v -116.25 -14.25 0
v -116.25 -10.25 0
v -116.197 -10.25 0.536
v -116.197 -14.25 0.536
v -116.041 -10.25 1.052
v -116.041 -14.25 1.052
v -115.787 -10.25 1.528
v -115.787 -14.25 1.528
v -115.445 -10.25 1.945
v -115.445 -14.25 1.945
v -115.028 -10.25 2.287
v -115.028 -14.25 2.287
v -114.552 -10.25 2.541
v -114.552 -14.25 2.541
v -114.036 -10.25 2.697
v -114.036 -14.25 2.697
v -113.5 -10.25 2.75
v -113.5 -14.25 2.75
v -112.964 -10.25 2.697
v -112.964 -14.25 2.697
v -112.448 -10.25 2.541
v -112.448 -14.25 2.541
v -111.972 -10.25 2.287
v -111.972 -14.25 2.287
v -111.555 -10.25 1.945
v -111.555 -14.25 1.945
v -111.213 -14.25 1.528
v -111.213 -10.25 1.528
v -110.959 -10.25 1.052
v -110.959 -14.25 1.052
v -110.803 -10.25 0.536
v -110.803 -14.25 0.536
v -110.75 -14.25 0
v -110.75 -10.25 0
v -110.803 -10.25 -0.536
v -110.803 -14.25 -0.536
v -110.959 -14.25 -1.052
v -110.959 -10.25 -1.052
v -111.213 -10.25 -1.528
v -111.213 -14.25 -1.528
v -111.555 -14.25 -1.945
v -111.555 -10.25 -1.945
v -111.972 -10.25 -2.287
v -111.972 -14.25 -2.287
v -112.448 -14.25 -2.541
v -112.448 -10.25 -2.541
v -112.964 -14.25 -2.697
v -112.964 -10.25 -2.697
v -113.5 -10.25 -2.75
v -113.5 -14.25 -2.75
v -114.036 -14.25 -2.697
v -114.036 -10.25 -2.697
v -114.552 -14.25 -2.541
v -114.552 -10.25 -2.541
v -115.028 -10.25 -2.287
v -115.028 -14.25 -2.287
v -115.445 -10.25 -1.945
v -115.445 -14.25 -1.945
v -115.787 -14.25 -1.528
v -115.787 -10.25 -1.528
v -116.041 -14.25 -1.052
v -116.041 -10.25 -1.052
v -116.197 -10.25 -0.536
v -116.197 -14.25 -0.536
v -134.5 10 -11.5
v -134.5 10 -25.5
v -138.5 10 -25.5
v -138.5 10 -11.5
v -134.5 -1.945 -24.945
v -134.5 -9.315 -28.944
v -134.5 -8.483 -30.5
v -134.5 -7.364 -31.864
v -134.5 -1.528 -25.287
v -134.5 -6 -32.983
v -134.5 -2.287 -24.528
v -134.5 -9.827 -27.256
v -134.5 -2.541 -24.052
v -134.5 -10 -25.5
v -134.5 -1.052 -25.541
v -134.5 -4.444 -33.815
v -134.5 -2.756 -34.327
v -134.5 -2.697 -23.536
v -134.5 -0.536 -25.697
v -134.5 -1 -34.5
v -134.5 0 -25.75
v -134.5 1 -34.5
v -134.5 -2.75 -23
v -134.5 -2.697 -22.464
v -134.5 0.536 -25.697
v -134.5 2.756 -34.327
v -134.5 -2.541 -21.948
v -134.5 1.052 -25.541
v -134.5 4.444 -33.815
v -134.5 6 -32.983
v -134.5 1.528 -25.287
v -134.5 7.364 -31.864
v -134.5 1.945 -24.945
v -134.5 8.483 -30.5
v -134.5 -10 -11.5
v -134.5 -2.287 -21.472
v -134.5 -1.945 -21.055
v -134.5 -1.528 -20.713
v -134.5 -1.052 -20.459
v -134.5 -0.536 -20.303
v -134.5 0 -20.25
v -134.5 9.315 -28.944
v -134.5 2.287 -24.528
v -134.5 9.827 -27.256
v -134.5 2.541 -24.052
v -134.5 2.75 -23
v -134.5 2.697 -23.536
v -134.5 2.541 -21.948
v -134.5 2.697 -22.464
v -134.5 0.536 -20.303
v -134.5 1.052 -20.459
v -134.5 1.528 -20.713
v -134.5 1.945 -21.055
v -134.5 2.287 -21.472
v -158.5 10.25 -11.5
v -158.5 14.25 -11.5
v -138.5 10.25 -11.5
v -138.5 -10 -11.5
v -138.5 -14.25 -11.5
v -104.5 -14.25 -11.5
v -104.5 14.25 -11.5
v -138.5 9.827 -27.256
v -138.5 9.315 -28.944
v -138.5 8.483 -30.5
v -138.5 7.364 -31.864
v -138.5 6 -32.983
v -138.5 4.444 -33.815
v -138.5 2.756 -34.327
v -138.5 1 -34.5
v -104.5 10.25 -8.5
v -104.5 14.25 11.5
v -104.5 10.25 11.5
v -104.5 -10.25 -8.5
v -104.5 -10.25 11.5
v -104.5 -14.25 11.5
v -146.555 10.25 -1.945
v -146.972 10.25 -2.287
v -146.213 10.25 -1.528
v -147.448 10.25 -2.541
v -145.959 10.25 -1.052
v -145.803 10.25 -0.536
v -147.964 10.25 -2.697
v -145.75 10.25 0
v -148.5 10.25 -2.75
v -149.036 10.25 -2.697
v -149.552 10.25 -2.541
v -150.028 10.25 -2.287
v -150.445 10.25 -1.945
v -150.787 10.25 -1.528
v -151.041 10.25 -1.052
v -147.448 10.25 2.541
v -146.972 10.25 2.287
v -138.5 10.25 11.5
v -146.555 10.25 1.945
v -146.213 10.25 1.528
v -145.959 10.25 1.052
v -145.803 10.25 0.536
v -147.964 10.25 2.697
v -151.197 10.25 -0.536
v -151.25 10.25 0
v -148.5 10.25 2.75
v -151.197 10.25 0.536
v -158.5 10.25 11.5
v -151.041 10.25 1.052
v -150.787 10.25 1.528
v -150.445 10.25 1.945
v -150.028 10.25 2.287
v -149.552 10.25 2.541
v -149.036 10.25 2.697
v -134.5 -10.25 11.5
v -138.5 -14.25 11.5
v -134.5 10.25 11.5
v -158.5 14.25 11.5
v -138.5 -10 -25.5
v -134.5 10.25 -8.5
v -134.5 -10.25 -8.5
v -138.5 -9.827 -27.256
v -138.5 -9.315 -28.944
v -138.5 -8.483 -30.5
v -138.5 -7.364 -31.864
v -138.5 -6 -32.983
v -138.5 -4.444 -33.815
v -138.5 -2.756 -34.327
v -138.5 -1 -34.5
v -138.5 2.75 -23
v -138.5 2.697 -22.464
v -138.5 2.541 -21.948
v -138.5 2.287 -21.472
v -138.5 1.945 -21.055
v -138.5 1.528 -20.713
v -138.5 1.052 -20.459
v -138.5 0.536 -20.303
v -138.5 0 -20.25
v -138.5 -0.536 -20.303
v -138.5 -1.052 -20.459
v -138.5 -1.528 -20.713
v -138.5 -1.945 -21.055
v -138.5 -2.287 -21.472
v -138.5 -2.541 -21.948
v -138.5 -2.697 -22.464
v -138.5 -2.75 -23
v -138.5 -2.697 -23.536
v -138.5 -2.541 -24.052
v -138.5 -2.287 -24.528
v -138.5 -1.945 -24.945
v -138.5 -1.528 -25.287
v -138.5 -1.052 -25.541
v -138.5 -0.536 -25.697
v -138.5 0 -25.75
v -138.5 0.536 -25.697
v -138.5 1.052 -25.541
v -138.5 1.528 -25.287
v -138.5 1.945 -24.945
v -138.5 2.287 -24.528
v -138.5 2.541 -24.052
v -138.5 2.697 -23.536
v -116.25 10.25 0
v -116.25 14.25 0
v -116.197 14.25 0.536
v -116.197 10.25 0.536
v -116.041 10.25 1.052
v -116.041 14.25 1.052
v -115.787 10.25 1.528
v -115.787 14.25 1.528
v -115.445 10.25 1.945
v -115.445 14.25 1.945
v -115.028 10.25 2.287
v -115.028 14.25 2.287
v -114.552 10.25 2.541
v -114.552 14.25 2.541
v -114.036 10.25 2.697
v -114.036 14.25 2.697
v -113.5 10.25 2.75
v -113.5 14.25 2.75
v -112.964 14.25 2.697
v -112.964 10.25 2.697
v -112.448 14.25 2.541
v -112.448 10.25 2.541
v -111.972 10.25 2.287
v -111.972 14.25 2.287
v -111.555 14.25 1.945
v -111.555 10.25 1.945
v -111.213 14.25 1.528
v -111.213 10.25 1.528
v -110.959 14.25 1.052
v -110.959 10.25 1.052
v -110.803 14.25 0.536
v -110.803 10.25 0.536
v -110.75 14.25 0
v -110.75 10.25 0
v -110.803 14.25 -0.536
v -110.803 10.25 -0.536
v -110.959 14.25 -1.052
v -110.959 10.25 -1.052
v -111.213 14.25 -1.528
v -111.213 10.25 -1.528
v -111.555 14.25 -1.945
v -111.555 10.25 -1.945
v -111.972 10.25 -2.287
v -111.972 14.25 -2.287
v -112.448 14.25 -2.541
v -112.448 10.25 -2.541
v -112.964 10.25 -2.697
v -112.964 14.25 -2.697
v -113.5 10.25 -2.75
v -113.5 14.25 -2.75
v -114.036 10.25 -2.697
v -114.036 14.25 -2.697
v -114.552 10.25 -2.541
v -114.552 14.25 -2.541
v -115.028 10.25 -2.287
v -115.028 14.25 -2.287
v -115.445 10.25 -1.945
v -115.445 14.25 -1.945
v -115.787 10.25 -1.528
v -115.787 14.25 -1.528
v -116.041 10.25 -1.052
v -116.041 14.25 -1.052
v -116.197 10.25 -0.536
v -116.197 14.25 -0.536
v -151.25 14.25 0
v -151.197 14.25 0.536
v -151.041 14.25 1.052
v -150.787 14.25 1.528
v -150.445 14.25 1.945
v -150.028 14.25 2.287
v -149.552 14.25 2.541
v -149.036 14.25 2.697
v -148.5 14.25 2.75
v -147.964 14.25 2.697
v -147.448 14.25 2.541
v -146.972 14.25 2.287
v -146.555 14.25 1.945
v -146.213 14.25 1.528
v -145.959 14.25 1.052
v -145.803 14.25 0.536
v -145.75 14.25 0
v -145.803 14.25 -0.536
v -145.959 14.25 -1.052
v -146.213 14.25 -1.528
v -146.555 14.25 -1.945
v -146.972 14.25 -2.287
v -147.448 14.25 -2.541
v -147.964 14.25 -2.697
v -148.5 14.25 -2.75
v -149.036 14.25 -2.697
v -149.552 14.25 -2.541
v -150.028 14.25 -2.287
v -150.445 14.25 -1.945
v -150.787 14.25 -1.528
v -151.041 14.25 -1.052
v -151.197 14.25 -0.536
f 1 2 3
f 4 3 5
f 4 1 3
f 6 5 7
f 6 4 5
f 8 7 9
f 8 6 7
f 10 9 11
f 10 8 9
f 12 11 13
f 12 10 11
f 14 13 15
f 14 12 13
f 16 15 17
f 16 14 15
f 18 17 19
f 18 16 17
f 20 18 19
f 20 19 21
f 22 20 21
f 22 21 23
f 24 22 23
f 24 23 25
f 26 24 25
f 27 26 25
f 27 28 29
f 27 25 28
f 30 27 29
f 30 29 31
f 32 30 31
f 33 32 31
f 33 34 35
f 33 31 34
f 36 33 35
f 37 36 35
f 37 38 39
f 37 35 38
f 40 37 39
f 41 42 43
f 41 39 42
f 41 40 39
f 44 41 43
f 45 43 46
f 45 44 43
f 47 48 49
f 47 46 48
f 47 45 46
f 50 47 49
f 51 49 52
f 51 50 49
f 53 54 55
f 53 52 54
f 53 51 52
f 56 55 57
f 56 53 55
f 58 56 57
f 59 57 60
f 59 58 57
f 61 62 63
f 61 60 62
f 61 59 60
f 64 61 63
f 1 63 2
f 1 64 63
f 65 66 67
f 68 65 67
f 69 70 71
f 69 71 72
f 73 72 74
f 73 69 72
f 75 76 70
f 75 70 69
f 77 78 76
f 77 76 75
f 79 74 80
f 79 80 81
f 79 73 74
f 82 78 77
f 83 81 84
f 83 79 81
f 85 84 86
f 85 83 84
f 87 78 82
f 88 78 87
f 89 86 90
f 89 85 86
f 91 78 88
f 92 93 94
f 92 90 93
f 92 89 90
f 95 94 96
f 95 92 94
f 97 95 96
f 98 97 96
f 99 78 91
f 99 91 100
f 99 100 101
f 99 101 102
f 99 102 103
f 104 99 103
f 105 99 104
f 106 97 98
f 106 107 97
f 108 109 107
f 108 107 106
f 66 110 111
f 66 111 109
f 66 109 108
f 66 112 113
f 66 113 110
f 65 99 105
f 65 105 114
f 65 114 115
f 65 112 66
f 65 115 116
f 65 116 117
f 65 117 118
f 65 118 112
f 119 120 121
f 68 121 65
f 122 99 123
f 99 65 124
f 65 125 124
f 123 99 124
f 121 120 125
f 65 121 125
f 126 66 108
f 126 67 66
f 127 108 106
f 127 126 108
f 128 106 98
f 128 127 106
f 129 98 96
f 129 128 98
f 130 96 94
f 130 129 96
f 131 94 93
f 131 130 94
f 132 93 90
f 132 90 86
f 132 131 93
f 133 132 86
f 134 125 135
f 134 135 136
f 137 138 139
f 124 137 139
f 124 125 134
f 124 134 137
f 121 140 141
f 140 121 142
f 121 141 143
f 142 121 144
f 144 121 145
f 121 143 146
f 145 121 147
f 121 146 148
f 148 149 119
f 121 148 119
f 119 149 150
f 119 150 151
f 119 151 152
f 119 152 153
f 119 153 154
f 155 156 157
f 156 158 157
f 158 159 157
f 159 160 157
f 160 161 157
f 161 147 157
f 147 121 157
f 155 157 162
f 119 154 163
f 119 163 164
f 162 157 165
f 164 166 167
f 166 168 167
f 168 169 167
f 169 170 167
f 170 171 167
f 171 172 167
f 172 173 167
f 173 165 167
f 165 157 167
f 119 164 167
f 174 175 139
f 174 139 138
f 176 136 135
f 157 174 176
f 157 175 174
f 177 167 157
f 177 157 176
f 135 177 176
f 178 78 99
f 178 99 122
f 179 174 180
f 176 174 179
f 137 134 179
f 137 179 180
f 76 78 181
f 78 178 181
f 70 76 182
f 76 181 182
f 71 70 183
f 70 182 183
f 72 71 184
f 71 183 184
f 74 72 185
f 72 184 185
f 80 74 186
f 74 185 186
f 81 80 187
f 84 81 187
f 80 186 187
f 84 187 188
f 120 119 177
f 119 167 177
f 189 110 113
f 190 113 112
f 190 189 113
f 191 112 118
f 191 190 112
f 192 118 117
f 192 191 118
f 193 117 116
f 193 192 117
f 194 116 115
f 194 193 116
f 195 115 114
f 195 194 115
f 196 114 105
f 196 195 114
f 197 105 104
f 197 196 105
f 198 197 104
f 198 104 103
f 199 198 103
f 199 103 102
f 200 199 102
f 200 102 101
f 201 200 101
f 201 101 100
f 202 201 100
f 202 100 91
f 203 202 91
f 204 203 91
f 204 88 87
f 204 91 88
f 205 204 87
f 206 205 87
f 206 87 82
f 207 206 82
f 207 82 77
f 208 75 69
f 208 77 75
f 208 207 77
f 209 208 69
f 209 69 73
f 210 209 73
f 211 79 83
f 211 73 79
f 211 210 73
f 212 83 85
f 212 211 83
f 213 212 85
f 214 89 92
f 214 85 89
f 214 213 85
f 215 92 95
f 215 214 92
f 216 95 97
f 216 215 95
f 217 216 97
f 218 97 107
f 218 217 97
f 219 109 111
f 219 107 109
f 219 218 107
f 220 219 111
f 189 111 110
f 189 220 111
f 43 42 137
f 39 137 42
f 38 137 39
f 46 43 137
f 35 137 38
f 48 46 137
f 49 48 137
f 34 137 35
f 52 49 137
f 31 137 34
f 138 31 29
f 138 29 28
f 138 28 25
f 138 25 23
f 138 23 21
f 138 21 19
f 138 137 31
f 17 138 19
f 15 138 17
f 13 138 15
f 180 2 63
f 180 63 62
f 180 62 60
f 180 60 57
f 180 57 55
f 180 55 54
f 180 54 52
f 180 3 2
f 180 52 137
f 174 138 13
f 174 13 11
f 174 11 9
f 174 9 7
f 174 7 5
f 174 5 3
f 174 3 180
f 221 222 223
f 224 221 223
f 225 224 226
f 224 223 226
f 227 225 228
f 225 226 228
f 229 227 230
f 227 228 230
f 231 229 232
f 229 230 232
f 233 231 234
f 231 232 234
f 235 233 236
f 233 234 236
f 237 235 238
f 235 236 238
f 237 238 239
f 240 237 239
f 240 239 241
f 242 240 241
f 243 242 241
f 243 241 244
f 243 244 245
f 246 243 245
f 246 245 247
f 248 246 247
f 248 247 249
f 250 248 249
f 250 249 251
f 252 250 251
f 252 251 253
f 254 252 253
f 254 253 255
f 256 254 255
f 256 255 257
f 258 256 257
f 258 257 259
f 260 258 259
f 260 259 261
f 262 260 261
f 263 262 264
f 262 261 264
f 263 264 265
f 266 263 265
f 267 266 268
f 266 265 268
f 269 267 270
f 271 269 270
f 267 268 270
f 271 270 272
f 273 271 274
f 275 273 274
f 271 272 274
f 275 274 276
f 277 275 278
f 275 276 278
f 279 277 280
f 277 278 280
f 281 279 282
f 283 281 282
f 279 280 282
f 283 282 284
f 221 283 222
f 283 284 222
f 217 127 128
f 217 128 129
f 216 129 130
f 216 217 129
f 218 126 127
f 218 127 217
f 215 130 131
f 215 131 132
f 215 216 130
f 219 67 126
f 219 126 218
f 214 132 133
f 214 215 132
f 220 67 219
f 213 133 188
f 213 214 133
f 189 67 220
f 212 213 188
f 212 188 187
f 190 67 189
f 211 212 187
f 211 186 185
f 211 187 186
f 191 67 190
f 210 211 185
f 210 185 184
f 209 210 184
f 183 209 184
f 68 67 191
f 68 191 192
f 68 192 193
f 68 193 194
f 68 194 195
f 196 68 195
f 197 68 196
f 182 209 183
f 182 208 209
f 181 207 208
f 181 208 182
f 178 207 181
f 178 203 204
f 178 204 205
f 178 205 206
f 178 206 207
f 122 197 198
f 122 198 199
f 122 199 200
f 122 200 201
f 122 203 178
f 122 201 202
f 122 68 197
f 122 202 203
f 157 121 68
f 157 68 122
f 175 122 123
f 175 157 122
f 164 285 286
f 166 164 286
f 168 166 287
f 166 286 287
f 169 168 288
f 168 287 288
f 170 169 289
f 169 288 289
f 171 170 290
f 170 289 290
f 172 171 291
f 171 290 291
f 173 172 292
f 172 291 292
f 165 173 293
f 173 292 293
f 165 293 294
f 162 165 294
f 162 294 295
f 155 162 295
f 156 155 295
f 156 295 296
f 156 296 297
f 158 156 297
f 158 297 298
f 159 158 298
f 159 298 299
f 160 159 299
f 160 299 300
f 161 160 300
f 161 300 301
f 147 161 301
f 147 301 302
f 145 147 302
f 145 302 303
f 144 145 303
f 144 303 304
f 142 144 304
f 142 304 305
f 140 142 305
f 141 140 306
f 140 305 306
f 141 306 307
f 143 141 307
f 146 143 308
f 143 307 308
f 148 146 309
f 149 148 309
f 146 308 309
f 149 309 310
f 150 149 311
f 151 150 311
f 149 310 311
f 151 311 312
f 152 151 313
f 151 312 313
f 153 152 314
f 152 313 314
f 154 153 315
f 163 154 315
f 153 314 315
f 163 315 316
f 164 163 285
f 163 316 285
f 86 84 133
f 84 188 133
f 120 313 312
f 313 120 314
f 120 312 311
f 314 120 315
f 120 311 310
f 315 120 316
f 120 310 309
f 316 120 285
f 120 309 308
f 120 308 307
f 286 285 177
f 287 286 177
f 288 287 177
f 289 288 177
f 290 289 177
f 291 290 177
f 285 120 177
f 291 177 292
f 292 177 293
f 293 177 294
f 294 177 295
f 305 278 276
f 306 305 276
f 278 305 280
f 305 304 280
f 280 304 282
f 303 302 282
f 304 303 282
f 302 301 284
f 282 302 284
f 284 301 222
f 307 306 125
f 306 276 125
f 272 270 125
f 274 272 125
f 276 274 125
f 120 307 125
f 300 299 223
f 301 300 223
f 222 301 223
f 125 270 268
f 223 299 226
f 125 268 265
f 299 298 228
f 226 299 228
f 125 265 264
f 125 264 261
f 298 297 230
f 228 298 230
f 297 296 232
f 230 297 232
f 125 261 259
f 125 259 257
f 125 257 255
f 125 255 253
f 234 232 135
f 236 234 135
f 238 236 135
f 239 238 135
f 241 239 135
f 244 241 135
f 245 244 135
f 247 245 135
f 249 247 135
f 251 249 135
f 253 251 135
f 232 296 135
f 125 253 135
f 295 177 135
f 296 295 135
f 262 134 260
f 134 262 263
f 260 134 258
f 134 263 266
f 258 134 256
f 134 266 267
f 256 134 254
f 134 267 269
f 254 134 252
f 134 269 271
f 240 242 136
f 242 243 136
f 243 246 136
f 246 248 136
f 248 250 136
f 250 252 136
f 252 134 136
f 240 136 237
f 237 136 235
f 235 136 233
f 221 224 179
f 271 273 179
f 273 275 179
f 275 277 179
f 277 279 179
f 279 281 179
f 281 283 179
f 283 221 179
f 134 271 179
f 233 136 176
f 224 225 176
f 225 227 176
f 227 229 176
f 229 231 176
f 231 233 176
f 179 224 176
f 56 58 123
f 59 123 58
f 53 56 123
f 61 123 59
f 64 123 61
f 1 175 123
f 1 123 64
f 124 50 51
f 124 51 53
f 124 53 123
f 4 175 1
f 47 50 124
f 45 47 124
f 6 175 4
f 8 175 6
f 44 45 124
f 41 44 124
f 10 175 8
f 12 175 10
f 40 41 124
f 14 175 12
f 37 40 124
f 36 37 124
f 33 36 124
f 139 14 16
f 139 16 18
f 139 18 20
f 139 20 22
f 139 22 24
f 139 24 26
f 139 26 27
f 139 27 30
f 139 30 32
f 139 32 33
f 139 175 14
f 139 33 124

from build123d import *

# Parameters (mm, degrees)
PAD077_DEPTH            = 11.5
SKETCH069_W             = 10.25
SKETCH069_H             = 30
PAD078_DEPTH            = 3
SKETCH070_R             = 2.75
POCKET048_DEPTH         = 5
SKETCH148_W             = 4
SKETCH148_H             = 20
POCKET049_DEPTH         = 11.501
POCKET049_DEPTH_BACK    = 11.501
SKETCH149_W             = 20
SKETCH149_H             = 4
PAD079_DEPTH            = 23
SKETCH150_R             = 2.75
POCKET050_DEPTH         = 34.001
FILLET003_R             = 9
BODY057_PLACEMENT_ANGLE = 90


with BuildPart() as part:
    # Sketch068 → Pad077 (new body, symmetric)
    with BuildSketch(Plane.XY):
        Polygon((0, 0), (10.25, 0), (10.25, 20), (14.25, 20), (14.25, -34), (10.25, -34), (10.25, -4), (0, -4), align=None)
    pad077 = extrude(amount=PAD077_DEPTH, both=True)

    # Sketch069 (on Face9 of Pad043) → Pad078 (join)
    with BuildSketch(Plane(origin=(0, 0, -11.5), x_dir=(1, 0, 0), z_dir=(0, 0, -1))):
        with Locations((5.125, 19)):
            Rectangle(SKETCH069_W, SKETCH069_H)
    pad078 = extrude(amount=-PAD078_DEPTH)

    # Sketch070 (on Face9 of Pad044) → Pocket048 (cut)
    with BuildSketch(Plane.YZ.offset(14.25)):
        with Locations((-25, 0)):
            Circle(SKETCH070_R)
        with Locations((10, 0)):
            Circle(SKETCH070_R)
    pocket048 = extrude(amount=-POCKET048_DEPTH, mode=Mode.SUBTRACT)

    # Mirrored028: Pad077, Pad078, Pocket048 across Sketch068 V_Axis
    add(pad077.mirror(Plane(origin=(0, 0, 0), x_dir=(0, 0, 1), z_dir=(1, 0, 0))))
    add(pad078.mirror(Plane(origin=(0, 0, 0), x_dir=(0, 0, 1), z_dir=(1, 0, 0))))
    add(pocket048.mirror(Plane(origin=(0, 0, 0), x_dir=(0, 0, 1), z_dir=(1, 0, 0))), mode=Mode.SUBTRACT)

    # Sketch148 → Pocket049 (cut, two sides)
    with BuildSketch(Plane.XY) as pocket049_sk:
        with Locations((-12.25, 10)):
            Rectangle(SKETCH148_W, SKETCH148_H)
    extrude(amount=-POCKET049_DEPTH, mode=Mode.SUBTRACT)
    extrude(pocket049_sk.sketch, amount=POCKET049_DEPTH_BACK, mode=Mode.SUBTRACT)

    # Sketch149 → Pad079 (join)
    with BuildSketch(Plane.XY.offset(-11.5)):
        with Locations((0, -2)):
            Rectangle(SKETCH149_W, SKETCH149_H)
    extrude(amount=-PAD079_DEPTH)

    # Sketch150 → Pocket050 (cut, through all)
    with BuildSketch(Plane(origin=(0, 0, -23), x_dir=(1, 0, 0), z_dir=(0, -1, 0))):
        Circle(SKETCH150_R)
    extrude(amount=POCKET050_DEPTH, mode=Mode.SUBTRACT)

    # Fillet003
    fillet003_edges = [part.edges().sort_by_distance(p)[0] for p in [
        (10, -2, -34.5),
        (-10, -2, -34.5),
    ]]
    fillet(fillet003_edges, radius=FILLET003_R)


with BuildPart() as part_1:
    # Body057 placement: moved
    add(part.part.moved(Location((-138.5, 0, 0))).rotate(Axis((-138.5, 0, 0), (0, 0, 1)), BODY057_PLACEMENT_ANGLE))


solid = part_1.part
